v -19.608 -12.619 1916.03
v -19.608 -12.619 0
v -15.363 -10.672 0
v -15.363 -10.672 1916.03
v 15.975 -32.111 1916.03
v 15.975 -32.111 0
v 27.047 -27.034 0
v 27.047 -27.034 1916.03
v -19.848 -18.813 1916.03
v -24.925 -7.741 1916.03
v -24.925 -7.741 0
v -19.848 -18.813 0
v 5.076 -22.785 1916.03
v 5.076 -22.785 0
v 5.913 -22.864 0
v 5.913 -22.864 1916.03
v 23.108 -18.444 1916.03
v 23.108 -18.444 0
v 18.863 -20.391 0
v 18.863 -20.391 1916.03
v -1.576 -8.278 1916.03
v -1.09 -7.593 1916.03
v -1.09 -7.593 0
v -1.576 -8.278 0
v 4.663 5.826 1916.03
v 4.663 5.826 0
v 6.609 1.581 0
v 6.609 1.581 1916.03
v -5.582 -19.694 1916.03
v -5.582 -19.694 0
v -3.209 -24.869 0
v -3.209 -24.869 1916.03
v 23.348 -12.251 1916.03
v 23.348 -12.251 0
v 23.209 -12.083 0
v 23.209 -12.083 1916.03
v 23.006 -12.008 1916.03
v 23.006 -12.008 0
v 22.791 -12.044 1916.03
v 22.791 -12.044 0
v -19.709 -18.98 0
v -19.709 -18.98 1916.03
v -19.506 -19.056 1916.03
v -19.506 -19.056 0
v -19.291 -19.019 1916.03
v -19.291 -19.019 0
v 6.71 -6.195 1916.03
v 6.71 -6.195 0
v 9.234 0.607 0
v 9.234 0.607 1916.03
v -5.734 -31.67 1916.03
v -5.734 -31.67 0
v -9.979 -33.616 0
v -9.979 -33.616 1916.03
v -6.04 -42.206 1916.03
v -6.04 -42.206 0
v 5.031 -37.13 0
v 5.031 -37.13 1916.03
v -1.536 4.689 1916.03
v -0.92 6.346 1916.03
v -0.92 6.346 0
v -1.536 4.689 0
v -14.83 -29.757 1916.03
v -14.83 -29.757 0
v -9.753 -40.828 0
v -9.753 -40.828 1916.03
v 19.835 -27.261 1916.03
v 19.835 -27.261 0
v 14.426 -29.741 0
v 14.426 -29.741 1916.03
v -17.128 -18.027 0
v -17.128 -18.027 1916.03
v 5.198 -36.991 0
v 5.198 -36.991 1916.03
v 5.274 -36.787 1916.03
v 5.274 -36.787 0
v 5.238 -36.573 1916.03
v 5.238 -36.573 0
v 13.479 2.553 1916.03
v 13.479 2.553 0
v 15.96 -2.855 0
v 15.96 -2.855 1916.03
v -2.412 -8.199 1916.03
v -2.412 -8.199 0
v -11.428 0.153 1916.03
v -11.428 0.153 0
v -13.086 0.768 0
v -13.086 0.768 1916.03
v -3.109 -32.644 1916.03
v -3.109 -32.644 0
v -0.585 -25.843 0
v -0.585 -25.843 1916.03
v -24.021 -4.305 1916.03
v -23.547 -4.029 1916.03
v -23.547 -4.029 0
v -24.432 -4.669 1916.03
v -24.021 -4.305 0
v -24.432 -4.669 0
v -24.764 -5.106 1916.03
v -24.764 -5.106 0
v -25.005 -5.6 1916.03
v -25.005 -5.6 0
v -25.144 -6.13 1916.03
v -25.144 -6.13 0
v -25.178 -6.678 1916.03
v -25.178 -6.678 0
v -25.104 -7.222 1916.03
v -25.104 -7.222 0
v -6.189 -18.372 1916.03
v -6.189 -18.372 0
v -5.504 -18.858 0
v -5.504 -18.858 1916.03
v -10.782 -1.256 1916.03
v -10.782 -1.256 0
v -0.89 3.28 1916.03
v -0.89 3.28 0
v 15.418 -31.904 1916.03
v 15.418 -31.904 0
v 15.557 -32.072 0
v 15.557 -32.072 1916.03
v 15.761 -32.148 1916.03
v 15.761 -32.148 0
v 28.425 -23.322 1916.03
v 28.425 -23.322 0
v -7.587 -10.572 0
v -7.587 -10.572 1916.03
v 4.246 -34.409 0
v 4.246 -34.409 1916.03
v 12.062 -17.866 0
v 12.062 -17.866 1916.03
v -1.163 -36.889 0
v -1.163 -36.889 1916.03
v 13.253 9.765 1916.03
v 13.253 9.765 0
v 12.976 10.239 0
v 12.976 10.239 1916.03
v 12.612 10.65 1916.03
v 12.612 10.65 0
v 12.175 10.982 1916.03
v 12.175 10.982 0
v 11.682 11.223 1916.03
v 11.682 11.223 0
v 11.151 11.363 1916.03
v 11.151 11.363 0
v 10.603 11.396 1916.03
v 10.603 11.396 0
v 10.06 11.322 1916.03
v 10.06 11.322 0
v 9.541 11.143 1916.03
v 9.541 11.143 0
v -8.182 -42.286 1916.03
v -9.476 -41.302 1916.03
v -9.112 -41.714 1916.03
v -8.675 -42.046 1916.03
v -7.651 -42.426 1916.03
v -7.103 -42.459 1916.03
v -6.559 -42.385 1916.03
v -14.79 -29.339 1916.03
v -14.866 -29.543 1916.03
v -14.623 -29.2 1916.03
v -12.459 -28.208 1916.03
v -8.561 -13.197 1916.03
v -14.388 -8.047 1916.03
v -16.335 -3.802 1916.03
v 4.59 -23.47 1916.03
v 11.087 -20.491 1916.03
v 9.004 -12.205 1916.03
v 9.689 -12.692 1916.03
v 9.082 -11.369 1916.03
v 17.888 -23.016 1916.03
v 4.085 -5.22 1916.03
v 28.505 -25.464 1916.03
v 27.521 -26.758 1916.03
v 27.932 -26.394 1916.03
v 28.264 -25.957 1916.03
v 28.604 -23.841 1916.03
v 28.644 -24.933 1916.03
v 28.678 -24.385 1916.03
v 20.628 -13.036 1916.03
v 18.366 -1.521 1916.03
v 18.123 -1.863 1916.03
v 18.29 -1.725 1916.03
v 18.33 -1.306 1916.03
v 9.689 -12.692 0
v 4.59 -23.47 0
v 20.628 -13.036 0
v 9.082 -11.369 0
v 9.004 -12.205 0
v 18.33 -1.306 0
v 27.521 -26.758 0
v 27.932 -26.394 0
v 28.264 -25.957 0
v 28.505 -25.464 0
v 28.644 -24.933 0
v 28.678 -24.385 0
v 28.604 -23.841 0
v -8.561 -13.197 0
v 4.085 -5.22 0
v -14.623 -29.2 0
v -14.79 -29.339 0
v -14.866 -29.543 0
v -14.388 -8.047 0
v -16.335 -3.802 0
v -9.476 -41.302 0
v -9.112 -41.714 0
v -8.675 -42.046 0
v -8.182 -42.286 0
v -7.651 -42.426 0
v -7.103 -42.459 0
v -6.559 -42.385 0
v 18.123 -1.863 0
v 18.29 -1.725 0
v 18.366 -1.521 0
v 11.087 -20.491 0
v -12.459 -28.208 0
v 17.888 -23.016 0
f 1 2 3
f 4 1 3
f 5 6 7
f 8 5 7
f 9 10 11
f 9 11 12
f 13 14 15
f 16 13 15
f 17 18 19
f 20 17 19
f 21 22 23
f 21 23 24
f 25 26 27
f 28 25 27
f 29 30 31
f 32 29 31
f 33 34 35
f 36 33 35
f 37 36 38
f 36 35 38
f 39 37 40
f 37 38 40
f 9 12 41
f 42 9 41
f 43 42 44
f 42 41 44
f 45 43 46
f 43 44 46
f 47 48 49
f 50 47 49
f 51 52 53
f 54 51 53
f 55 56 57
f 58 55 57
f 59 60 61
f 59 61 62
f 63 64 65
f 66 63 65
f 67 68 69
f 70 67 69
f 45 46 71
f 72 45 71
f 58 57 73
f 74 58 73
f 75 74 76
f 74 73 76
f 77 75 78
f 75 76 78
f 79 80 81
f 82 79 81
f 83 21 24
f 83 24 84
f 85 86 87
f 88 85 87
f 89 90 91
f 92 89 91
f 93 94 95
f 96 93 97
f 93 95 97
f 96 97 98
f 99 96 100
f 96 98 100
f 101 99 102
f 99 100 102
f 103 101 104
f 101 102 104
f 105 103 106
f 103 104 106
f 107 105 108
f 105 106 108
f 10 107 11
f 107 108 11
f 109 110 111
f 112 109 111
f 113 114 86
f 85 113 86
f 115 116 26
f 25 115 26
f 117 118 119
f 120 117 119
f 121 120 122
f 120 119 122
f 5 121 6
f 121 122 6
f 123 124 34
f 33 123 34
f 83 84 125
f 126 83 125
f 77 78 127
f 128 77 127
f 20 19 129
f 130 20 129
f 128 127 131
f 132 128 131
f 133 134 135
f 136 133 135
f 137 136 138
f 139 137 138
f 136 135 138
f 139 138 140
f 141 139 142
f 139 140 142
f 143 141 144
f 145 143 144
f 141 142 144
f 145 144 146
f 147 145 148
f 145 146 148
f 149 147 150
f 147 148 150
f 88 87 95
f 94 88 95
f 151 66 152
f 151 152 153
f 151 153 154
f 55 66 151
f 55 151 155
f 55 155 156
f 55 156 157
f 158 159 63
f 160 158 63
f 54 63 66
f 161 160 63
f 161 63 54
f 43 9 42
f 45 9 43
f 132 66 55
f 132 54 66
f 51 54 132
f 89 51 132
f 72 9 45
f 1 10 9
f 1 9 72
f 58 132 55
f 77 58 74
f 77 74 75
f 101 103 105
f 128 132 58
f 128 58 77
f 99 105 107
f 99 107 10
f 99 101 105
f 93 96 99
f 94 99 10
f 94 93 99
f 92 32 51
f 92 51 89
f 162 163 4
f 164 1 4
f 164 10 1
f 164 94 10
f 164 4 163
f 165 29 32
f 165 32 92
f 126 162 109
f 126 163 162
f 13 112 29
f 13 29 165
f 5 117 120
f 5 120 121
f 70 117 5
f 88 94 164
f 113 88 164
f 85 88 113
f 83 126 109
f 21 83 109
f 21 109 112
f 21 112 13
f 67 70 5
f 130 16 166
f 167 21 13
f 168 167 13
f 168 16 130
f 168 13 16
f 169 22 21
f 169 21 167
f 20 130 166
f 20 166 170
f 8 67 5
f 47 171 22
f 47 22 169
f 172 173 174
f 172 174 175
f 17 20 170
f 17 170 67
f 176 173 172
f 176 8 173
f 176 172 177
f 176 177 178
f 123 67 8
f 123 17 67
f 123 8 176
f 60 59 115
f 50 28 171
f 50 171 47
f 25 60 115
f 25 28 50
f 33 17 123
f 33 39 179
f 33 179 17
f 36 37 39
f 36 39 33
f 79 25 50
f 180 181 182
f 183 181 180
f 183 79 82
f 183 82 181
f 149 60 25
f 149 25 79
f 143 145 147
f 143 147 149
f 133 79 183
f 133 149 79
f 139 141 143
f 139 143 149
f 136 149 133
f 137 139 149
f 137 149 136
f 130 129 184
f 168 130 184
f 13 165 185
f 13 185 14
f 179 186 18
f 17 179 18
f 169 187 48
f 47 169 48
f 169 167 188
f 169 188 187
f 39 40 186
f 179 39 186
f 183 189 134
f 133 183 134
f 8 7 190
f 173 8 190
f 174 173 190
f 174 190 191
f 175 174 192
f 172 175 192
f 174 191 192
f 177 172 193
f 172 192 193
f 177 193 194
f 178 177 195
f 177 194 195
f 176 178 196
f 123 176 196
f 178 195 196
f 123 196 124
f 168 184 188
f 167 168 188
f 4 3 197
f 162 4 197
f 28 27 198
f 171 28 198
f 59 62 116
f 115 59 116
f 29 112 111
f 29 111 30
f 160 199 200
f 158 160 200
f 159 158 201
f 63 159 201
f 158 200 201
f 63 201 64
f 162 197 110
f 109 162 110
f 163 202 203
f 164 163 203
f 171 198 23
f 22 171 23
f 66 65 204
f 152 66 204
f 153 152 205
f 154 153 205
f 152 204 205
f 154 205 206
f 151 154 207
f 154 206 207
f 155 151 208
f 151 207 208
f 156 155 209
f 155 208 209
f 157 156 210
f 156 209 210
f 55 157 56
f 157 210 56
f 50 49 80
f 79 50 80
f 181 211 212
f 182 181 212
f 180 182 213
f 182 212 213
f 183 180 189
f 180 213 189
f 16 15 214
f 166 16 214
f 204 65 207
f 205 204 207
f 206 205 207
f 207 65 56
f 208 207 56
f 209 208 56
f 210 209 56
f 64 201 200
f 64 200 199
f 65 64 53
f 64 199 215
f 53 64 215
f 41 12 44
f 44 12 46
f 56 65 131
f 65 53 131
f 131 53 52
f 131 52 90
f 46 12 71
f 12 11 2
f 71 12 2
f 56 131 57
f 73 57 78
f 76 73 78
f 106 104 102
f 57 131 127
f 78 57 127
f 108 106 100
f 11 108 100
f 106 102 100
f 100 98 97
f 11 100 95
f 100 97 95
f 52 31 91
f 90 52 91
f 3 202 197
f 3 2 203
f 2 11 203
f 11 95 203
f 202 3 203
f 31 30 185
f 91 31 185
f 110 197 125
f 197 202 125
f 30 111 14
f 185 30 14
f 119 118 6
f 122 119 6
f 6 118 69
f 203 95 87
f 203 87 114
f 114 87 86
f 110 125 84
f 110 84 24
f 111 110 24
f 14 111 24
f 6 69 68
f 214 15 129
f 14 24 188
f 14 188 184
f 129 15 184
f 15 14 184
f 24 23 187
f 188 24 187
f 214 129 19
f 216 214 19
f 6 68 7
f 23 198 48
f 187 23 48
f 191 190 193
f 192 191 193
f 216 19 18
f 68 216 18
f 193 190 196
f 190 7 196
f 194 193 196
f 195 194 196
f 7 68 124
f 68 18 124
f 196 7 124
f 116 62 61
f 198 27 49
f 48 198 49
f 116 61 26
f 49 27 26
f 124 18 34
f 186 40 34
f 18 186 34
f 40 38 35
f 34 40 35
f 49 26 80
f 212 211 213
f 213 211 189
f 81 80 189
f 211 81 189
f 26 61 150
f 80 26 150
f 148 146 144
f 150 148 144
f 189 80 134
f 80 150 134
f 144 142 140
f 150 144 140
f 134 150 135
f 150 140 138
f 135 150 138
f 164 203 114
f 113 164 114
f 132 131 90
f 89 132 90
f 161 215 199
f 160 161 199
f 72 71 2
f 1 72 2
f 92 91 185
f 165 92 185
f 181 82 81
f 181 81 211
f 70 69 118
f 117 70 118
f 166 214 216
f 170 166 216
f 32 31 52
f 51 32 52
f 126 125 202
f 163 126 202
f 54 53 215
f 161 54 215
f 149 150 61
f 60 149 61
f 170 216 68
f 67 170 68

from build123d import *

# Parameters (mm, degrees)
BOSS_EXTRUDE1_DEPTH = 1916.03


with BuildPart() as part:
    # Sketch1 → Boss-Extrude1 (new body)
    with BuildSketch(Plane.XY):
        with BuildLine():
            Line((9.540560799, 11.143246319), (-0.920367578, 6.346418672))
            Line((-0.920367578, 6.346418672), (-1.535685442, 4.688896979))
            Line((-1.535685442, 4.688896979), (-0.889704709, 3.280141302))
            Line((-0.889704709, 3.280141302), (4.662851743, 5.826249577))
            Line((4.662851743, 5.826249577), (6.609420976, 1.581168696))
            Line((6.609420976, 1.581168696), (4.0846078, -5.220084546))
            Line((4.0846078, -5.220084546), (-1.08995176, -7.592863468))
            Line((-1.08995176, -7.592863468), (-1.576145343, -8.277856753))
            Line((-1.576145343, -8.277856753), (-2.41246372, -8.199297401))
            Line((-2.41246372, -8.199297401), (-7.58702328, -10.572076323))
            Line((-7.58702328, -10.572076323), (-14.388276522, -8.047263147))
            Line((-14.388276522, -8.047263147), (-16.334845756, -3.802182266))
            Line((-16.334845756, -3.802182266), (-10.782289304, -1.256073991))
            Line((-10.782289304, -1.256073991), (-11.428270037, 0.152681685))
            Line((-11.428270037, 0.152681685), (-13.08579173, 0.767999548))
            Line((-13.08579173, 0.767999548), (-23.546720108, -4.028828099))
            ThreePointArc((-23.546720108, -4.028828099), (-25.004600338, -5.599544785), (-24.924812915, -7.741086201))
            Line((-24.924812915, -7.741086201), (-19.848003398, -18.812599428))
            ThreePointArc((-19.848003398, -18.812599428), (-19.612395895, -19.031281462), (-19.291164682, -19.019313349))
            Line((-19.291164682, -19.019313349), (-17.127765546, -18.027293098))
            Line((-17.127765546, -18.027293098), (-19.607816172, -12.618795258))
            Line((-19.607816172, -12.618795258), (-15.362735291, -10.672226024))
            Line((-15.362735291, -10.672226024), (-8.561482049, -13.197039201))
            Line((-8.561482049, -13.197039201), (-6.188703127, -18.37159876))
            Line((-6.188703127, -18.37159876), (-5.503709842, -18.857792344))
            Line((-5.503709842, -18.857792344), (-5.582269194, -19.694110721))
            Line((-5.582269194, -19.694110721), (-3.209490272, -24.868670281))
            Line((-3.209490272, -24.868670281), (-5.734303449, -31.669923523))
            Line((-5.734303449, -31.669923523), (-9.97938433, -33.616492757))
            Line((-9.97938433, -33.616492757), (-12.459434956, -28.207994916))
            Line((-12.459434956, -28.207994916), (-14.622834092, -29.200015166))
            ThreePointArc((-14.622834092, -29.200015166), (-14.841516127, -29.435622669), (-14.829548013, -29.756853882))
            Line((-14.829548013, -29.756853882), (-9.752738496, -40.828367108))
            ThreePointArc((-9.752738496, -40.828367108), (-8.182021811, -42.286247338), (-6.040480394, -42.206459915))
            Line((-6.040480394, -42.206459915), (5.031032832, -37.129650398))
            ThreePointArc((5.031032832, -37.129650398), (5.249714867, -36.894042895), (5.237746753, -36.572811683))
            Line((5.237746753, -36.572811683), (4.245726503, -34.409412547))
            Line((4.245726503, -34.409412547), (-1.162771338, -36.889463173))
            Line((-1.162771338, -36.889463173), (-3.109340571, -32.644382292))
            Line((-3.109340571, -32.644382292), (-0.584527395, -25.84312905))
            Line((-0.584527395, -25.84312905), (4.590032165, -23.470350128))
            Line((4.590032165, -23.470350128), (5.076225748, -22.785356843))
            Line((5.076225748, -22.785356843), (5.912544125, -22.863916195))
            Line((5.912544125, -22.863916195), (11.087103685, -20.491137273))
            Line((11.087103685, -20.491137273), (17.888356928, -23.015950449))
            Line((17.888356928, -23.015950449), (19.834926161, -27.26103133))
            Line((19.834926161, -27.26103133), (14.426428321, -29.741081956))
            Line((14.426428321, -29.741081956), (15.418448571, -31.904481093))
            ThreePointArc((15.418448571, -31.904481093), (15.654056074, -32.123163127), (15.975287286, -32.111195014))
            Line((15.975287286, -32.111195014), (27.046800513, -27.034385497))
            ThreePointArc((27.046800513, -27.034385497), (28.504680743, -25.463668811), (28.42489332, -23.322127395))
            Line((28.42489332, -23.322127395), (23.348083803, -12.250614168))
            ThreePointArc((23.348083803, -12.250614168), (23.1124763, -12.031932134), (22.791245088, -12.043900247))
            Line((22.791245088, -12.043900247), (20.627845951, -13.035920498))
            Line((20.627845951, -13.035920498), (23.107896577, -18.444418338))
            Line((23.107896577, -18.444418338), (18.862815696, -20.390987572))
            Line((18.862815696, -20.390987572), (12.061562454, -17.866174395))
            Line((12.061562454, -17.866174395), (9.688783532, -12.691614835))
            Line((9.688783532, -12.691614835), (9.003790248, -12.205421252))
            Line((9.003790248, -12.205421252), (9.082349599, -11.369102875))
            Line((9.082349599, -11.369102875), (6.709570677, -6.194543315))
            Line((6.709570677, -6.194543315), (9.234383854, 0.606709927))
            Line((9.234383854, 0.606709927), (13.479464735, 2.553279161))
            Line((13.479464735, 2.553279161), (15.959515361, -2.85521868))
            Line((15.959515361, -2.85521868), (18.122914497, -1.863198429))
            ThreePointArc((18.122914497, -1.863198429), (18.341596532, -1.627590927), (18.329628418, -1.306359714))
            Line((18.329628418, -1.306359714), (13.252818901, 9.765153513))
            ThreePointArc((13.252818901, 9.765153513), (11.682102216, 11.223033742), (9.540560799, 11.143246319))
        make_face()
    extrude(amount=BOSS_EXTRUDE1_DEPTH)


solid = part.part
